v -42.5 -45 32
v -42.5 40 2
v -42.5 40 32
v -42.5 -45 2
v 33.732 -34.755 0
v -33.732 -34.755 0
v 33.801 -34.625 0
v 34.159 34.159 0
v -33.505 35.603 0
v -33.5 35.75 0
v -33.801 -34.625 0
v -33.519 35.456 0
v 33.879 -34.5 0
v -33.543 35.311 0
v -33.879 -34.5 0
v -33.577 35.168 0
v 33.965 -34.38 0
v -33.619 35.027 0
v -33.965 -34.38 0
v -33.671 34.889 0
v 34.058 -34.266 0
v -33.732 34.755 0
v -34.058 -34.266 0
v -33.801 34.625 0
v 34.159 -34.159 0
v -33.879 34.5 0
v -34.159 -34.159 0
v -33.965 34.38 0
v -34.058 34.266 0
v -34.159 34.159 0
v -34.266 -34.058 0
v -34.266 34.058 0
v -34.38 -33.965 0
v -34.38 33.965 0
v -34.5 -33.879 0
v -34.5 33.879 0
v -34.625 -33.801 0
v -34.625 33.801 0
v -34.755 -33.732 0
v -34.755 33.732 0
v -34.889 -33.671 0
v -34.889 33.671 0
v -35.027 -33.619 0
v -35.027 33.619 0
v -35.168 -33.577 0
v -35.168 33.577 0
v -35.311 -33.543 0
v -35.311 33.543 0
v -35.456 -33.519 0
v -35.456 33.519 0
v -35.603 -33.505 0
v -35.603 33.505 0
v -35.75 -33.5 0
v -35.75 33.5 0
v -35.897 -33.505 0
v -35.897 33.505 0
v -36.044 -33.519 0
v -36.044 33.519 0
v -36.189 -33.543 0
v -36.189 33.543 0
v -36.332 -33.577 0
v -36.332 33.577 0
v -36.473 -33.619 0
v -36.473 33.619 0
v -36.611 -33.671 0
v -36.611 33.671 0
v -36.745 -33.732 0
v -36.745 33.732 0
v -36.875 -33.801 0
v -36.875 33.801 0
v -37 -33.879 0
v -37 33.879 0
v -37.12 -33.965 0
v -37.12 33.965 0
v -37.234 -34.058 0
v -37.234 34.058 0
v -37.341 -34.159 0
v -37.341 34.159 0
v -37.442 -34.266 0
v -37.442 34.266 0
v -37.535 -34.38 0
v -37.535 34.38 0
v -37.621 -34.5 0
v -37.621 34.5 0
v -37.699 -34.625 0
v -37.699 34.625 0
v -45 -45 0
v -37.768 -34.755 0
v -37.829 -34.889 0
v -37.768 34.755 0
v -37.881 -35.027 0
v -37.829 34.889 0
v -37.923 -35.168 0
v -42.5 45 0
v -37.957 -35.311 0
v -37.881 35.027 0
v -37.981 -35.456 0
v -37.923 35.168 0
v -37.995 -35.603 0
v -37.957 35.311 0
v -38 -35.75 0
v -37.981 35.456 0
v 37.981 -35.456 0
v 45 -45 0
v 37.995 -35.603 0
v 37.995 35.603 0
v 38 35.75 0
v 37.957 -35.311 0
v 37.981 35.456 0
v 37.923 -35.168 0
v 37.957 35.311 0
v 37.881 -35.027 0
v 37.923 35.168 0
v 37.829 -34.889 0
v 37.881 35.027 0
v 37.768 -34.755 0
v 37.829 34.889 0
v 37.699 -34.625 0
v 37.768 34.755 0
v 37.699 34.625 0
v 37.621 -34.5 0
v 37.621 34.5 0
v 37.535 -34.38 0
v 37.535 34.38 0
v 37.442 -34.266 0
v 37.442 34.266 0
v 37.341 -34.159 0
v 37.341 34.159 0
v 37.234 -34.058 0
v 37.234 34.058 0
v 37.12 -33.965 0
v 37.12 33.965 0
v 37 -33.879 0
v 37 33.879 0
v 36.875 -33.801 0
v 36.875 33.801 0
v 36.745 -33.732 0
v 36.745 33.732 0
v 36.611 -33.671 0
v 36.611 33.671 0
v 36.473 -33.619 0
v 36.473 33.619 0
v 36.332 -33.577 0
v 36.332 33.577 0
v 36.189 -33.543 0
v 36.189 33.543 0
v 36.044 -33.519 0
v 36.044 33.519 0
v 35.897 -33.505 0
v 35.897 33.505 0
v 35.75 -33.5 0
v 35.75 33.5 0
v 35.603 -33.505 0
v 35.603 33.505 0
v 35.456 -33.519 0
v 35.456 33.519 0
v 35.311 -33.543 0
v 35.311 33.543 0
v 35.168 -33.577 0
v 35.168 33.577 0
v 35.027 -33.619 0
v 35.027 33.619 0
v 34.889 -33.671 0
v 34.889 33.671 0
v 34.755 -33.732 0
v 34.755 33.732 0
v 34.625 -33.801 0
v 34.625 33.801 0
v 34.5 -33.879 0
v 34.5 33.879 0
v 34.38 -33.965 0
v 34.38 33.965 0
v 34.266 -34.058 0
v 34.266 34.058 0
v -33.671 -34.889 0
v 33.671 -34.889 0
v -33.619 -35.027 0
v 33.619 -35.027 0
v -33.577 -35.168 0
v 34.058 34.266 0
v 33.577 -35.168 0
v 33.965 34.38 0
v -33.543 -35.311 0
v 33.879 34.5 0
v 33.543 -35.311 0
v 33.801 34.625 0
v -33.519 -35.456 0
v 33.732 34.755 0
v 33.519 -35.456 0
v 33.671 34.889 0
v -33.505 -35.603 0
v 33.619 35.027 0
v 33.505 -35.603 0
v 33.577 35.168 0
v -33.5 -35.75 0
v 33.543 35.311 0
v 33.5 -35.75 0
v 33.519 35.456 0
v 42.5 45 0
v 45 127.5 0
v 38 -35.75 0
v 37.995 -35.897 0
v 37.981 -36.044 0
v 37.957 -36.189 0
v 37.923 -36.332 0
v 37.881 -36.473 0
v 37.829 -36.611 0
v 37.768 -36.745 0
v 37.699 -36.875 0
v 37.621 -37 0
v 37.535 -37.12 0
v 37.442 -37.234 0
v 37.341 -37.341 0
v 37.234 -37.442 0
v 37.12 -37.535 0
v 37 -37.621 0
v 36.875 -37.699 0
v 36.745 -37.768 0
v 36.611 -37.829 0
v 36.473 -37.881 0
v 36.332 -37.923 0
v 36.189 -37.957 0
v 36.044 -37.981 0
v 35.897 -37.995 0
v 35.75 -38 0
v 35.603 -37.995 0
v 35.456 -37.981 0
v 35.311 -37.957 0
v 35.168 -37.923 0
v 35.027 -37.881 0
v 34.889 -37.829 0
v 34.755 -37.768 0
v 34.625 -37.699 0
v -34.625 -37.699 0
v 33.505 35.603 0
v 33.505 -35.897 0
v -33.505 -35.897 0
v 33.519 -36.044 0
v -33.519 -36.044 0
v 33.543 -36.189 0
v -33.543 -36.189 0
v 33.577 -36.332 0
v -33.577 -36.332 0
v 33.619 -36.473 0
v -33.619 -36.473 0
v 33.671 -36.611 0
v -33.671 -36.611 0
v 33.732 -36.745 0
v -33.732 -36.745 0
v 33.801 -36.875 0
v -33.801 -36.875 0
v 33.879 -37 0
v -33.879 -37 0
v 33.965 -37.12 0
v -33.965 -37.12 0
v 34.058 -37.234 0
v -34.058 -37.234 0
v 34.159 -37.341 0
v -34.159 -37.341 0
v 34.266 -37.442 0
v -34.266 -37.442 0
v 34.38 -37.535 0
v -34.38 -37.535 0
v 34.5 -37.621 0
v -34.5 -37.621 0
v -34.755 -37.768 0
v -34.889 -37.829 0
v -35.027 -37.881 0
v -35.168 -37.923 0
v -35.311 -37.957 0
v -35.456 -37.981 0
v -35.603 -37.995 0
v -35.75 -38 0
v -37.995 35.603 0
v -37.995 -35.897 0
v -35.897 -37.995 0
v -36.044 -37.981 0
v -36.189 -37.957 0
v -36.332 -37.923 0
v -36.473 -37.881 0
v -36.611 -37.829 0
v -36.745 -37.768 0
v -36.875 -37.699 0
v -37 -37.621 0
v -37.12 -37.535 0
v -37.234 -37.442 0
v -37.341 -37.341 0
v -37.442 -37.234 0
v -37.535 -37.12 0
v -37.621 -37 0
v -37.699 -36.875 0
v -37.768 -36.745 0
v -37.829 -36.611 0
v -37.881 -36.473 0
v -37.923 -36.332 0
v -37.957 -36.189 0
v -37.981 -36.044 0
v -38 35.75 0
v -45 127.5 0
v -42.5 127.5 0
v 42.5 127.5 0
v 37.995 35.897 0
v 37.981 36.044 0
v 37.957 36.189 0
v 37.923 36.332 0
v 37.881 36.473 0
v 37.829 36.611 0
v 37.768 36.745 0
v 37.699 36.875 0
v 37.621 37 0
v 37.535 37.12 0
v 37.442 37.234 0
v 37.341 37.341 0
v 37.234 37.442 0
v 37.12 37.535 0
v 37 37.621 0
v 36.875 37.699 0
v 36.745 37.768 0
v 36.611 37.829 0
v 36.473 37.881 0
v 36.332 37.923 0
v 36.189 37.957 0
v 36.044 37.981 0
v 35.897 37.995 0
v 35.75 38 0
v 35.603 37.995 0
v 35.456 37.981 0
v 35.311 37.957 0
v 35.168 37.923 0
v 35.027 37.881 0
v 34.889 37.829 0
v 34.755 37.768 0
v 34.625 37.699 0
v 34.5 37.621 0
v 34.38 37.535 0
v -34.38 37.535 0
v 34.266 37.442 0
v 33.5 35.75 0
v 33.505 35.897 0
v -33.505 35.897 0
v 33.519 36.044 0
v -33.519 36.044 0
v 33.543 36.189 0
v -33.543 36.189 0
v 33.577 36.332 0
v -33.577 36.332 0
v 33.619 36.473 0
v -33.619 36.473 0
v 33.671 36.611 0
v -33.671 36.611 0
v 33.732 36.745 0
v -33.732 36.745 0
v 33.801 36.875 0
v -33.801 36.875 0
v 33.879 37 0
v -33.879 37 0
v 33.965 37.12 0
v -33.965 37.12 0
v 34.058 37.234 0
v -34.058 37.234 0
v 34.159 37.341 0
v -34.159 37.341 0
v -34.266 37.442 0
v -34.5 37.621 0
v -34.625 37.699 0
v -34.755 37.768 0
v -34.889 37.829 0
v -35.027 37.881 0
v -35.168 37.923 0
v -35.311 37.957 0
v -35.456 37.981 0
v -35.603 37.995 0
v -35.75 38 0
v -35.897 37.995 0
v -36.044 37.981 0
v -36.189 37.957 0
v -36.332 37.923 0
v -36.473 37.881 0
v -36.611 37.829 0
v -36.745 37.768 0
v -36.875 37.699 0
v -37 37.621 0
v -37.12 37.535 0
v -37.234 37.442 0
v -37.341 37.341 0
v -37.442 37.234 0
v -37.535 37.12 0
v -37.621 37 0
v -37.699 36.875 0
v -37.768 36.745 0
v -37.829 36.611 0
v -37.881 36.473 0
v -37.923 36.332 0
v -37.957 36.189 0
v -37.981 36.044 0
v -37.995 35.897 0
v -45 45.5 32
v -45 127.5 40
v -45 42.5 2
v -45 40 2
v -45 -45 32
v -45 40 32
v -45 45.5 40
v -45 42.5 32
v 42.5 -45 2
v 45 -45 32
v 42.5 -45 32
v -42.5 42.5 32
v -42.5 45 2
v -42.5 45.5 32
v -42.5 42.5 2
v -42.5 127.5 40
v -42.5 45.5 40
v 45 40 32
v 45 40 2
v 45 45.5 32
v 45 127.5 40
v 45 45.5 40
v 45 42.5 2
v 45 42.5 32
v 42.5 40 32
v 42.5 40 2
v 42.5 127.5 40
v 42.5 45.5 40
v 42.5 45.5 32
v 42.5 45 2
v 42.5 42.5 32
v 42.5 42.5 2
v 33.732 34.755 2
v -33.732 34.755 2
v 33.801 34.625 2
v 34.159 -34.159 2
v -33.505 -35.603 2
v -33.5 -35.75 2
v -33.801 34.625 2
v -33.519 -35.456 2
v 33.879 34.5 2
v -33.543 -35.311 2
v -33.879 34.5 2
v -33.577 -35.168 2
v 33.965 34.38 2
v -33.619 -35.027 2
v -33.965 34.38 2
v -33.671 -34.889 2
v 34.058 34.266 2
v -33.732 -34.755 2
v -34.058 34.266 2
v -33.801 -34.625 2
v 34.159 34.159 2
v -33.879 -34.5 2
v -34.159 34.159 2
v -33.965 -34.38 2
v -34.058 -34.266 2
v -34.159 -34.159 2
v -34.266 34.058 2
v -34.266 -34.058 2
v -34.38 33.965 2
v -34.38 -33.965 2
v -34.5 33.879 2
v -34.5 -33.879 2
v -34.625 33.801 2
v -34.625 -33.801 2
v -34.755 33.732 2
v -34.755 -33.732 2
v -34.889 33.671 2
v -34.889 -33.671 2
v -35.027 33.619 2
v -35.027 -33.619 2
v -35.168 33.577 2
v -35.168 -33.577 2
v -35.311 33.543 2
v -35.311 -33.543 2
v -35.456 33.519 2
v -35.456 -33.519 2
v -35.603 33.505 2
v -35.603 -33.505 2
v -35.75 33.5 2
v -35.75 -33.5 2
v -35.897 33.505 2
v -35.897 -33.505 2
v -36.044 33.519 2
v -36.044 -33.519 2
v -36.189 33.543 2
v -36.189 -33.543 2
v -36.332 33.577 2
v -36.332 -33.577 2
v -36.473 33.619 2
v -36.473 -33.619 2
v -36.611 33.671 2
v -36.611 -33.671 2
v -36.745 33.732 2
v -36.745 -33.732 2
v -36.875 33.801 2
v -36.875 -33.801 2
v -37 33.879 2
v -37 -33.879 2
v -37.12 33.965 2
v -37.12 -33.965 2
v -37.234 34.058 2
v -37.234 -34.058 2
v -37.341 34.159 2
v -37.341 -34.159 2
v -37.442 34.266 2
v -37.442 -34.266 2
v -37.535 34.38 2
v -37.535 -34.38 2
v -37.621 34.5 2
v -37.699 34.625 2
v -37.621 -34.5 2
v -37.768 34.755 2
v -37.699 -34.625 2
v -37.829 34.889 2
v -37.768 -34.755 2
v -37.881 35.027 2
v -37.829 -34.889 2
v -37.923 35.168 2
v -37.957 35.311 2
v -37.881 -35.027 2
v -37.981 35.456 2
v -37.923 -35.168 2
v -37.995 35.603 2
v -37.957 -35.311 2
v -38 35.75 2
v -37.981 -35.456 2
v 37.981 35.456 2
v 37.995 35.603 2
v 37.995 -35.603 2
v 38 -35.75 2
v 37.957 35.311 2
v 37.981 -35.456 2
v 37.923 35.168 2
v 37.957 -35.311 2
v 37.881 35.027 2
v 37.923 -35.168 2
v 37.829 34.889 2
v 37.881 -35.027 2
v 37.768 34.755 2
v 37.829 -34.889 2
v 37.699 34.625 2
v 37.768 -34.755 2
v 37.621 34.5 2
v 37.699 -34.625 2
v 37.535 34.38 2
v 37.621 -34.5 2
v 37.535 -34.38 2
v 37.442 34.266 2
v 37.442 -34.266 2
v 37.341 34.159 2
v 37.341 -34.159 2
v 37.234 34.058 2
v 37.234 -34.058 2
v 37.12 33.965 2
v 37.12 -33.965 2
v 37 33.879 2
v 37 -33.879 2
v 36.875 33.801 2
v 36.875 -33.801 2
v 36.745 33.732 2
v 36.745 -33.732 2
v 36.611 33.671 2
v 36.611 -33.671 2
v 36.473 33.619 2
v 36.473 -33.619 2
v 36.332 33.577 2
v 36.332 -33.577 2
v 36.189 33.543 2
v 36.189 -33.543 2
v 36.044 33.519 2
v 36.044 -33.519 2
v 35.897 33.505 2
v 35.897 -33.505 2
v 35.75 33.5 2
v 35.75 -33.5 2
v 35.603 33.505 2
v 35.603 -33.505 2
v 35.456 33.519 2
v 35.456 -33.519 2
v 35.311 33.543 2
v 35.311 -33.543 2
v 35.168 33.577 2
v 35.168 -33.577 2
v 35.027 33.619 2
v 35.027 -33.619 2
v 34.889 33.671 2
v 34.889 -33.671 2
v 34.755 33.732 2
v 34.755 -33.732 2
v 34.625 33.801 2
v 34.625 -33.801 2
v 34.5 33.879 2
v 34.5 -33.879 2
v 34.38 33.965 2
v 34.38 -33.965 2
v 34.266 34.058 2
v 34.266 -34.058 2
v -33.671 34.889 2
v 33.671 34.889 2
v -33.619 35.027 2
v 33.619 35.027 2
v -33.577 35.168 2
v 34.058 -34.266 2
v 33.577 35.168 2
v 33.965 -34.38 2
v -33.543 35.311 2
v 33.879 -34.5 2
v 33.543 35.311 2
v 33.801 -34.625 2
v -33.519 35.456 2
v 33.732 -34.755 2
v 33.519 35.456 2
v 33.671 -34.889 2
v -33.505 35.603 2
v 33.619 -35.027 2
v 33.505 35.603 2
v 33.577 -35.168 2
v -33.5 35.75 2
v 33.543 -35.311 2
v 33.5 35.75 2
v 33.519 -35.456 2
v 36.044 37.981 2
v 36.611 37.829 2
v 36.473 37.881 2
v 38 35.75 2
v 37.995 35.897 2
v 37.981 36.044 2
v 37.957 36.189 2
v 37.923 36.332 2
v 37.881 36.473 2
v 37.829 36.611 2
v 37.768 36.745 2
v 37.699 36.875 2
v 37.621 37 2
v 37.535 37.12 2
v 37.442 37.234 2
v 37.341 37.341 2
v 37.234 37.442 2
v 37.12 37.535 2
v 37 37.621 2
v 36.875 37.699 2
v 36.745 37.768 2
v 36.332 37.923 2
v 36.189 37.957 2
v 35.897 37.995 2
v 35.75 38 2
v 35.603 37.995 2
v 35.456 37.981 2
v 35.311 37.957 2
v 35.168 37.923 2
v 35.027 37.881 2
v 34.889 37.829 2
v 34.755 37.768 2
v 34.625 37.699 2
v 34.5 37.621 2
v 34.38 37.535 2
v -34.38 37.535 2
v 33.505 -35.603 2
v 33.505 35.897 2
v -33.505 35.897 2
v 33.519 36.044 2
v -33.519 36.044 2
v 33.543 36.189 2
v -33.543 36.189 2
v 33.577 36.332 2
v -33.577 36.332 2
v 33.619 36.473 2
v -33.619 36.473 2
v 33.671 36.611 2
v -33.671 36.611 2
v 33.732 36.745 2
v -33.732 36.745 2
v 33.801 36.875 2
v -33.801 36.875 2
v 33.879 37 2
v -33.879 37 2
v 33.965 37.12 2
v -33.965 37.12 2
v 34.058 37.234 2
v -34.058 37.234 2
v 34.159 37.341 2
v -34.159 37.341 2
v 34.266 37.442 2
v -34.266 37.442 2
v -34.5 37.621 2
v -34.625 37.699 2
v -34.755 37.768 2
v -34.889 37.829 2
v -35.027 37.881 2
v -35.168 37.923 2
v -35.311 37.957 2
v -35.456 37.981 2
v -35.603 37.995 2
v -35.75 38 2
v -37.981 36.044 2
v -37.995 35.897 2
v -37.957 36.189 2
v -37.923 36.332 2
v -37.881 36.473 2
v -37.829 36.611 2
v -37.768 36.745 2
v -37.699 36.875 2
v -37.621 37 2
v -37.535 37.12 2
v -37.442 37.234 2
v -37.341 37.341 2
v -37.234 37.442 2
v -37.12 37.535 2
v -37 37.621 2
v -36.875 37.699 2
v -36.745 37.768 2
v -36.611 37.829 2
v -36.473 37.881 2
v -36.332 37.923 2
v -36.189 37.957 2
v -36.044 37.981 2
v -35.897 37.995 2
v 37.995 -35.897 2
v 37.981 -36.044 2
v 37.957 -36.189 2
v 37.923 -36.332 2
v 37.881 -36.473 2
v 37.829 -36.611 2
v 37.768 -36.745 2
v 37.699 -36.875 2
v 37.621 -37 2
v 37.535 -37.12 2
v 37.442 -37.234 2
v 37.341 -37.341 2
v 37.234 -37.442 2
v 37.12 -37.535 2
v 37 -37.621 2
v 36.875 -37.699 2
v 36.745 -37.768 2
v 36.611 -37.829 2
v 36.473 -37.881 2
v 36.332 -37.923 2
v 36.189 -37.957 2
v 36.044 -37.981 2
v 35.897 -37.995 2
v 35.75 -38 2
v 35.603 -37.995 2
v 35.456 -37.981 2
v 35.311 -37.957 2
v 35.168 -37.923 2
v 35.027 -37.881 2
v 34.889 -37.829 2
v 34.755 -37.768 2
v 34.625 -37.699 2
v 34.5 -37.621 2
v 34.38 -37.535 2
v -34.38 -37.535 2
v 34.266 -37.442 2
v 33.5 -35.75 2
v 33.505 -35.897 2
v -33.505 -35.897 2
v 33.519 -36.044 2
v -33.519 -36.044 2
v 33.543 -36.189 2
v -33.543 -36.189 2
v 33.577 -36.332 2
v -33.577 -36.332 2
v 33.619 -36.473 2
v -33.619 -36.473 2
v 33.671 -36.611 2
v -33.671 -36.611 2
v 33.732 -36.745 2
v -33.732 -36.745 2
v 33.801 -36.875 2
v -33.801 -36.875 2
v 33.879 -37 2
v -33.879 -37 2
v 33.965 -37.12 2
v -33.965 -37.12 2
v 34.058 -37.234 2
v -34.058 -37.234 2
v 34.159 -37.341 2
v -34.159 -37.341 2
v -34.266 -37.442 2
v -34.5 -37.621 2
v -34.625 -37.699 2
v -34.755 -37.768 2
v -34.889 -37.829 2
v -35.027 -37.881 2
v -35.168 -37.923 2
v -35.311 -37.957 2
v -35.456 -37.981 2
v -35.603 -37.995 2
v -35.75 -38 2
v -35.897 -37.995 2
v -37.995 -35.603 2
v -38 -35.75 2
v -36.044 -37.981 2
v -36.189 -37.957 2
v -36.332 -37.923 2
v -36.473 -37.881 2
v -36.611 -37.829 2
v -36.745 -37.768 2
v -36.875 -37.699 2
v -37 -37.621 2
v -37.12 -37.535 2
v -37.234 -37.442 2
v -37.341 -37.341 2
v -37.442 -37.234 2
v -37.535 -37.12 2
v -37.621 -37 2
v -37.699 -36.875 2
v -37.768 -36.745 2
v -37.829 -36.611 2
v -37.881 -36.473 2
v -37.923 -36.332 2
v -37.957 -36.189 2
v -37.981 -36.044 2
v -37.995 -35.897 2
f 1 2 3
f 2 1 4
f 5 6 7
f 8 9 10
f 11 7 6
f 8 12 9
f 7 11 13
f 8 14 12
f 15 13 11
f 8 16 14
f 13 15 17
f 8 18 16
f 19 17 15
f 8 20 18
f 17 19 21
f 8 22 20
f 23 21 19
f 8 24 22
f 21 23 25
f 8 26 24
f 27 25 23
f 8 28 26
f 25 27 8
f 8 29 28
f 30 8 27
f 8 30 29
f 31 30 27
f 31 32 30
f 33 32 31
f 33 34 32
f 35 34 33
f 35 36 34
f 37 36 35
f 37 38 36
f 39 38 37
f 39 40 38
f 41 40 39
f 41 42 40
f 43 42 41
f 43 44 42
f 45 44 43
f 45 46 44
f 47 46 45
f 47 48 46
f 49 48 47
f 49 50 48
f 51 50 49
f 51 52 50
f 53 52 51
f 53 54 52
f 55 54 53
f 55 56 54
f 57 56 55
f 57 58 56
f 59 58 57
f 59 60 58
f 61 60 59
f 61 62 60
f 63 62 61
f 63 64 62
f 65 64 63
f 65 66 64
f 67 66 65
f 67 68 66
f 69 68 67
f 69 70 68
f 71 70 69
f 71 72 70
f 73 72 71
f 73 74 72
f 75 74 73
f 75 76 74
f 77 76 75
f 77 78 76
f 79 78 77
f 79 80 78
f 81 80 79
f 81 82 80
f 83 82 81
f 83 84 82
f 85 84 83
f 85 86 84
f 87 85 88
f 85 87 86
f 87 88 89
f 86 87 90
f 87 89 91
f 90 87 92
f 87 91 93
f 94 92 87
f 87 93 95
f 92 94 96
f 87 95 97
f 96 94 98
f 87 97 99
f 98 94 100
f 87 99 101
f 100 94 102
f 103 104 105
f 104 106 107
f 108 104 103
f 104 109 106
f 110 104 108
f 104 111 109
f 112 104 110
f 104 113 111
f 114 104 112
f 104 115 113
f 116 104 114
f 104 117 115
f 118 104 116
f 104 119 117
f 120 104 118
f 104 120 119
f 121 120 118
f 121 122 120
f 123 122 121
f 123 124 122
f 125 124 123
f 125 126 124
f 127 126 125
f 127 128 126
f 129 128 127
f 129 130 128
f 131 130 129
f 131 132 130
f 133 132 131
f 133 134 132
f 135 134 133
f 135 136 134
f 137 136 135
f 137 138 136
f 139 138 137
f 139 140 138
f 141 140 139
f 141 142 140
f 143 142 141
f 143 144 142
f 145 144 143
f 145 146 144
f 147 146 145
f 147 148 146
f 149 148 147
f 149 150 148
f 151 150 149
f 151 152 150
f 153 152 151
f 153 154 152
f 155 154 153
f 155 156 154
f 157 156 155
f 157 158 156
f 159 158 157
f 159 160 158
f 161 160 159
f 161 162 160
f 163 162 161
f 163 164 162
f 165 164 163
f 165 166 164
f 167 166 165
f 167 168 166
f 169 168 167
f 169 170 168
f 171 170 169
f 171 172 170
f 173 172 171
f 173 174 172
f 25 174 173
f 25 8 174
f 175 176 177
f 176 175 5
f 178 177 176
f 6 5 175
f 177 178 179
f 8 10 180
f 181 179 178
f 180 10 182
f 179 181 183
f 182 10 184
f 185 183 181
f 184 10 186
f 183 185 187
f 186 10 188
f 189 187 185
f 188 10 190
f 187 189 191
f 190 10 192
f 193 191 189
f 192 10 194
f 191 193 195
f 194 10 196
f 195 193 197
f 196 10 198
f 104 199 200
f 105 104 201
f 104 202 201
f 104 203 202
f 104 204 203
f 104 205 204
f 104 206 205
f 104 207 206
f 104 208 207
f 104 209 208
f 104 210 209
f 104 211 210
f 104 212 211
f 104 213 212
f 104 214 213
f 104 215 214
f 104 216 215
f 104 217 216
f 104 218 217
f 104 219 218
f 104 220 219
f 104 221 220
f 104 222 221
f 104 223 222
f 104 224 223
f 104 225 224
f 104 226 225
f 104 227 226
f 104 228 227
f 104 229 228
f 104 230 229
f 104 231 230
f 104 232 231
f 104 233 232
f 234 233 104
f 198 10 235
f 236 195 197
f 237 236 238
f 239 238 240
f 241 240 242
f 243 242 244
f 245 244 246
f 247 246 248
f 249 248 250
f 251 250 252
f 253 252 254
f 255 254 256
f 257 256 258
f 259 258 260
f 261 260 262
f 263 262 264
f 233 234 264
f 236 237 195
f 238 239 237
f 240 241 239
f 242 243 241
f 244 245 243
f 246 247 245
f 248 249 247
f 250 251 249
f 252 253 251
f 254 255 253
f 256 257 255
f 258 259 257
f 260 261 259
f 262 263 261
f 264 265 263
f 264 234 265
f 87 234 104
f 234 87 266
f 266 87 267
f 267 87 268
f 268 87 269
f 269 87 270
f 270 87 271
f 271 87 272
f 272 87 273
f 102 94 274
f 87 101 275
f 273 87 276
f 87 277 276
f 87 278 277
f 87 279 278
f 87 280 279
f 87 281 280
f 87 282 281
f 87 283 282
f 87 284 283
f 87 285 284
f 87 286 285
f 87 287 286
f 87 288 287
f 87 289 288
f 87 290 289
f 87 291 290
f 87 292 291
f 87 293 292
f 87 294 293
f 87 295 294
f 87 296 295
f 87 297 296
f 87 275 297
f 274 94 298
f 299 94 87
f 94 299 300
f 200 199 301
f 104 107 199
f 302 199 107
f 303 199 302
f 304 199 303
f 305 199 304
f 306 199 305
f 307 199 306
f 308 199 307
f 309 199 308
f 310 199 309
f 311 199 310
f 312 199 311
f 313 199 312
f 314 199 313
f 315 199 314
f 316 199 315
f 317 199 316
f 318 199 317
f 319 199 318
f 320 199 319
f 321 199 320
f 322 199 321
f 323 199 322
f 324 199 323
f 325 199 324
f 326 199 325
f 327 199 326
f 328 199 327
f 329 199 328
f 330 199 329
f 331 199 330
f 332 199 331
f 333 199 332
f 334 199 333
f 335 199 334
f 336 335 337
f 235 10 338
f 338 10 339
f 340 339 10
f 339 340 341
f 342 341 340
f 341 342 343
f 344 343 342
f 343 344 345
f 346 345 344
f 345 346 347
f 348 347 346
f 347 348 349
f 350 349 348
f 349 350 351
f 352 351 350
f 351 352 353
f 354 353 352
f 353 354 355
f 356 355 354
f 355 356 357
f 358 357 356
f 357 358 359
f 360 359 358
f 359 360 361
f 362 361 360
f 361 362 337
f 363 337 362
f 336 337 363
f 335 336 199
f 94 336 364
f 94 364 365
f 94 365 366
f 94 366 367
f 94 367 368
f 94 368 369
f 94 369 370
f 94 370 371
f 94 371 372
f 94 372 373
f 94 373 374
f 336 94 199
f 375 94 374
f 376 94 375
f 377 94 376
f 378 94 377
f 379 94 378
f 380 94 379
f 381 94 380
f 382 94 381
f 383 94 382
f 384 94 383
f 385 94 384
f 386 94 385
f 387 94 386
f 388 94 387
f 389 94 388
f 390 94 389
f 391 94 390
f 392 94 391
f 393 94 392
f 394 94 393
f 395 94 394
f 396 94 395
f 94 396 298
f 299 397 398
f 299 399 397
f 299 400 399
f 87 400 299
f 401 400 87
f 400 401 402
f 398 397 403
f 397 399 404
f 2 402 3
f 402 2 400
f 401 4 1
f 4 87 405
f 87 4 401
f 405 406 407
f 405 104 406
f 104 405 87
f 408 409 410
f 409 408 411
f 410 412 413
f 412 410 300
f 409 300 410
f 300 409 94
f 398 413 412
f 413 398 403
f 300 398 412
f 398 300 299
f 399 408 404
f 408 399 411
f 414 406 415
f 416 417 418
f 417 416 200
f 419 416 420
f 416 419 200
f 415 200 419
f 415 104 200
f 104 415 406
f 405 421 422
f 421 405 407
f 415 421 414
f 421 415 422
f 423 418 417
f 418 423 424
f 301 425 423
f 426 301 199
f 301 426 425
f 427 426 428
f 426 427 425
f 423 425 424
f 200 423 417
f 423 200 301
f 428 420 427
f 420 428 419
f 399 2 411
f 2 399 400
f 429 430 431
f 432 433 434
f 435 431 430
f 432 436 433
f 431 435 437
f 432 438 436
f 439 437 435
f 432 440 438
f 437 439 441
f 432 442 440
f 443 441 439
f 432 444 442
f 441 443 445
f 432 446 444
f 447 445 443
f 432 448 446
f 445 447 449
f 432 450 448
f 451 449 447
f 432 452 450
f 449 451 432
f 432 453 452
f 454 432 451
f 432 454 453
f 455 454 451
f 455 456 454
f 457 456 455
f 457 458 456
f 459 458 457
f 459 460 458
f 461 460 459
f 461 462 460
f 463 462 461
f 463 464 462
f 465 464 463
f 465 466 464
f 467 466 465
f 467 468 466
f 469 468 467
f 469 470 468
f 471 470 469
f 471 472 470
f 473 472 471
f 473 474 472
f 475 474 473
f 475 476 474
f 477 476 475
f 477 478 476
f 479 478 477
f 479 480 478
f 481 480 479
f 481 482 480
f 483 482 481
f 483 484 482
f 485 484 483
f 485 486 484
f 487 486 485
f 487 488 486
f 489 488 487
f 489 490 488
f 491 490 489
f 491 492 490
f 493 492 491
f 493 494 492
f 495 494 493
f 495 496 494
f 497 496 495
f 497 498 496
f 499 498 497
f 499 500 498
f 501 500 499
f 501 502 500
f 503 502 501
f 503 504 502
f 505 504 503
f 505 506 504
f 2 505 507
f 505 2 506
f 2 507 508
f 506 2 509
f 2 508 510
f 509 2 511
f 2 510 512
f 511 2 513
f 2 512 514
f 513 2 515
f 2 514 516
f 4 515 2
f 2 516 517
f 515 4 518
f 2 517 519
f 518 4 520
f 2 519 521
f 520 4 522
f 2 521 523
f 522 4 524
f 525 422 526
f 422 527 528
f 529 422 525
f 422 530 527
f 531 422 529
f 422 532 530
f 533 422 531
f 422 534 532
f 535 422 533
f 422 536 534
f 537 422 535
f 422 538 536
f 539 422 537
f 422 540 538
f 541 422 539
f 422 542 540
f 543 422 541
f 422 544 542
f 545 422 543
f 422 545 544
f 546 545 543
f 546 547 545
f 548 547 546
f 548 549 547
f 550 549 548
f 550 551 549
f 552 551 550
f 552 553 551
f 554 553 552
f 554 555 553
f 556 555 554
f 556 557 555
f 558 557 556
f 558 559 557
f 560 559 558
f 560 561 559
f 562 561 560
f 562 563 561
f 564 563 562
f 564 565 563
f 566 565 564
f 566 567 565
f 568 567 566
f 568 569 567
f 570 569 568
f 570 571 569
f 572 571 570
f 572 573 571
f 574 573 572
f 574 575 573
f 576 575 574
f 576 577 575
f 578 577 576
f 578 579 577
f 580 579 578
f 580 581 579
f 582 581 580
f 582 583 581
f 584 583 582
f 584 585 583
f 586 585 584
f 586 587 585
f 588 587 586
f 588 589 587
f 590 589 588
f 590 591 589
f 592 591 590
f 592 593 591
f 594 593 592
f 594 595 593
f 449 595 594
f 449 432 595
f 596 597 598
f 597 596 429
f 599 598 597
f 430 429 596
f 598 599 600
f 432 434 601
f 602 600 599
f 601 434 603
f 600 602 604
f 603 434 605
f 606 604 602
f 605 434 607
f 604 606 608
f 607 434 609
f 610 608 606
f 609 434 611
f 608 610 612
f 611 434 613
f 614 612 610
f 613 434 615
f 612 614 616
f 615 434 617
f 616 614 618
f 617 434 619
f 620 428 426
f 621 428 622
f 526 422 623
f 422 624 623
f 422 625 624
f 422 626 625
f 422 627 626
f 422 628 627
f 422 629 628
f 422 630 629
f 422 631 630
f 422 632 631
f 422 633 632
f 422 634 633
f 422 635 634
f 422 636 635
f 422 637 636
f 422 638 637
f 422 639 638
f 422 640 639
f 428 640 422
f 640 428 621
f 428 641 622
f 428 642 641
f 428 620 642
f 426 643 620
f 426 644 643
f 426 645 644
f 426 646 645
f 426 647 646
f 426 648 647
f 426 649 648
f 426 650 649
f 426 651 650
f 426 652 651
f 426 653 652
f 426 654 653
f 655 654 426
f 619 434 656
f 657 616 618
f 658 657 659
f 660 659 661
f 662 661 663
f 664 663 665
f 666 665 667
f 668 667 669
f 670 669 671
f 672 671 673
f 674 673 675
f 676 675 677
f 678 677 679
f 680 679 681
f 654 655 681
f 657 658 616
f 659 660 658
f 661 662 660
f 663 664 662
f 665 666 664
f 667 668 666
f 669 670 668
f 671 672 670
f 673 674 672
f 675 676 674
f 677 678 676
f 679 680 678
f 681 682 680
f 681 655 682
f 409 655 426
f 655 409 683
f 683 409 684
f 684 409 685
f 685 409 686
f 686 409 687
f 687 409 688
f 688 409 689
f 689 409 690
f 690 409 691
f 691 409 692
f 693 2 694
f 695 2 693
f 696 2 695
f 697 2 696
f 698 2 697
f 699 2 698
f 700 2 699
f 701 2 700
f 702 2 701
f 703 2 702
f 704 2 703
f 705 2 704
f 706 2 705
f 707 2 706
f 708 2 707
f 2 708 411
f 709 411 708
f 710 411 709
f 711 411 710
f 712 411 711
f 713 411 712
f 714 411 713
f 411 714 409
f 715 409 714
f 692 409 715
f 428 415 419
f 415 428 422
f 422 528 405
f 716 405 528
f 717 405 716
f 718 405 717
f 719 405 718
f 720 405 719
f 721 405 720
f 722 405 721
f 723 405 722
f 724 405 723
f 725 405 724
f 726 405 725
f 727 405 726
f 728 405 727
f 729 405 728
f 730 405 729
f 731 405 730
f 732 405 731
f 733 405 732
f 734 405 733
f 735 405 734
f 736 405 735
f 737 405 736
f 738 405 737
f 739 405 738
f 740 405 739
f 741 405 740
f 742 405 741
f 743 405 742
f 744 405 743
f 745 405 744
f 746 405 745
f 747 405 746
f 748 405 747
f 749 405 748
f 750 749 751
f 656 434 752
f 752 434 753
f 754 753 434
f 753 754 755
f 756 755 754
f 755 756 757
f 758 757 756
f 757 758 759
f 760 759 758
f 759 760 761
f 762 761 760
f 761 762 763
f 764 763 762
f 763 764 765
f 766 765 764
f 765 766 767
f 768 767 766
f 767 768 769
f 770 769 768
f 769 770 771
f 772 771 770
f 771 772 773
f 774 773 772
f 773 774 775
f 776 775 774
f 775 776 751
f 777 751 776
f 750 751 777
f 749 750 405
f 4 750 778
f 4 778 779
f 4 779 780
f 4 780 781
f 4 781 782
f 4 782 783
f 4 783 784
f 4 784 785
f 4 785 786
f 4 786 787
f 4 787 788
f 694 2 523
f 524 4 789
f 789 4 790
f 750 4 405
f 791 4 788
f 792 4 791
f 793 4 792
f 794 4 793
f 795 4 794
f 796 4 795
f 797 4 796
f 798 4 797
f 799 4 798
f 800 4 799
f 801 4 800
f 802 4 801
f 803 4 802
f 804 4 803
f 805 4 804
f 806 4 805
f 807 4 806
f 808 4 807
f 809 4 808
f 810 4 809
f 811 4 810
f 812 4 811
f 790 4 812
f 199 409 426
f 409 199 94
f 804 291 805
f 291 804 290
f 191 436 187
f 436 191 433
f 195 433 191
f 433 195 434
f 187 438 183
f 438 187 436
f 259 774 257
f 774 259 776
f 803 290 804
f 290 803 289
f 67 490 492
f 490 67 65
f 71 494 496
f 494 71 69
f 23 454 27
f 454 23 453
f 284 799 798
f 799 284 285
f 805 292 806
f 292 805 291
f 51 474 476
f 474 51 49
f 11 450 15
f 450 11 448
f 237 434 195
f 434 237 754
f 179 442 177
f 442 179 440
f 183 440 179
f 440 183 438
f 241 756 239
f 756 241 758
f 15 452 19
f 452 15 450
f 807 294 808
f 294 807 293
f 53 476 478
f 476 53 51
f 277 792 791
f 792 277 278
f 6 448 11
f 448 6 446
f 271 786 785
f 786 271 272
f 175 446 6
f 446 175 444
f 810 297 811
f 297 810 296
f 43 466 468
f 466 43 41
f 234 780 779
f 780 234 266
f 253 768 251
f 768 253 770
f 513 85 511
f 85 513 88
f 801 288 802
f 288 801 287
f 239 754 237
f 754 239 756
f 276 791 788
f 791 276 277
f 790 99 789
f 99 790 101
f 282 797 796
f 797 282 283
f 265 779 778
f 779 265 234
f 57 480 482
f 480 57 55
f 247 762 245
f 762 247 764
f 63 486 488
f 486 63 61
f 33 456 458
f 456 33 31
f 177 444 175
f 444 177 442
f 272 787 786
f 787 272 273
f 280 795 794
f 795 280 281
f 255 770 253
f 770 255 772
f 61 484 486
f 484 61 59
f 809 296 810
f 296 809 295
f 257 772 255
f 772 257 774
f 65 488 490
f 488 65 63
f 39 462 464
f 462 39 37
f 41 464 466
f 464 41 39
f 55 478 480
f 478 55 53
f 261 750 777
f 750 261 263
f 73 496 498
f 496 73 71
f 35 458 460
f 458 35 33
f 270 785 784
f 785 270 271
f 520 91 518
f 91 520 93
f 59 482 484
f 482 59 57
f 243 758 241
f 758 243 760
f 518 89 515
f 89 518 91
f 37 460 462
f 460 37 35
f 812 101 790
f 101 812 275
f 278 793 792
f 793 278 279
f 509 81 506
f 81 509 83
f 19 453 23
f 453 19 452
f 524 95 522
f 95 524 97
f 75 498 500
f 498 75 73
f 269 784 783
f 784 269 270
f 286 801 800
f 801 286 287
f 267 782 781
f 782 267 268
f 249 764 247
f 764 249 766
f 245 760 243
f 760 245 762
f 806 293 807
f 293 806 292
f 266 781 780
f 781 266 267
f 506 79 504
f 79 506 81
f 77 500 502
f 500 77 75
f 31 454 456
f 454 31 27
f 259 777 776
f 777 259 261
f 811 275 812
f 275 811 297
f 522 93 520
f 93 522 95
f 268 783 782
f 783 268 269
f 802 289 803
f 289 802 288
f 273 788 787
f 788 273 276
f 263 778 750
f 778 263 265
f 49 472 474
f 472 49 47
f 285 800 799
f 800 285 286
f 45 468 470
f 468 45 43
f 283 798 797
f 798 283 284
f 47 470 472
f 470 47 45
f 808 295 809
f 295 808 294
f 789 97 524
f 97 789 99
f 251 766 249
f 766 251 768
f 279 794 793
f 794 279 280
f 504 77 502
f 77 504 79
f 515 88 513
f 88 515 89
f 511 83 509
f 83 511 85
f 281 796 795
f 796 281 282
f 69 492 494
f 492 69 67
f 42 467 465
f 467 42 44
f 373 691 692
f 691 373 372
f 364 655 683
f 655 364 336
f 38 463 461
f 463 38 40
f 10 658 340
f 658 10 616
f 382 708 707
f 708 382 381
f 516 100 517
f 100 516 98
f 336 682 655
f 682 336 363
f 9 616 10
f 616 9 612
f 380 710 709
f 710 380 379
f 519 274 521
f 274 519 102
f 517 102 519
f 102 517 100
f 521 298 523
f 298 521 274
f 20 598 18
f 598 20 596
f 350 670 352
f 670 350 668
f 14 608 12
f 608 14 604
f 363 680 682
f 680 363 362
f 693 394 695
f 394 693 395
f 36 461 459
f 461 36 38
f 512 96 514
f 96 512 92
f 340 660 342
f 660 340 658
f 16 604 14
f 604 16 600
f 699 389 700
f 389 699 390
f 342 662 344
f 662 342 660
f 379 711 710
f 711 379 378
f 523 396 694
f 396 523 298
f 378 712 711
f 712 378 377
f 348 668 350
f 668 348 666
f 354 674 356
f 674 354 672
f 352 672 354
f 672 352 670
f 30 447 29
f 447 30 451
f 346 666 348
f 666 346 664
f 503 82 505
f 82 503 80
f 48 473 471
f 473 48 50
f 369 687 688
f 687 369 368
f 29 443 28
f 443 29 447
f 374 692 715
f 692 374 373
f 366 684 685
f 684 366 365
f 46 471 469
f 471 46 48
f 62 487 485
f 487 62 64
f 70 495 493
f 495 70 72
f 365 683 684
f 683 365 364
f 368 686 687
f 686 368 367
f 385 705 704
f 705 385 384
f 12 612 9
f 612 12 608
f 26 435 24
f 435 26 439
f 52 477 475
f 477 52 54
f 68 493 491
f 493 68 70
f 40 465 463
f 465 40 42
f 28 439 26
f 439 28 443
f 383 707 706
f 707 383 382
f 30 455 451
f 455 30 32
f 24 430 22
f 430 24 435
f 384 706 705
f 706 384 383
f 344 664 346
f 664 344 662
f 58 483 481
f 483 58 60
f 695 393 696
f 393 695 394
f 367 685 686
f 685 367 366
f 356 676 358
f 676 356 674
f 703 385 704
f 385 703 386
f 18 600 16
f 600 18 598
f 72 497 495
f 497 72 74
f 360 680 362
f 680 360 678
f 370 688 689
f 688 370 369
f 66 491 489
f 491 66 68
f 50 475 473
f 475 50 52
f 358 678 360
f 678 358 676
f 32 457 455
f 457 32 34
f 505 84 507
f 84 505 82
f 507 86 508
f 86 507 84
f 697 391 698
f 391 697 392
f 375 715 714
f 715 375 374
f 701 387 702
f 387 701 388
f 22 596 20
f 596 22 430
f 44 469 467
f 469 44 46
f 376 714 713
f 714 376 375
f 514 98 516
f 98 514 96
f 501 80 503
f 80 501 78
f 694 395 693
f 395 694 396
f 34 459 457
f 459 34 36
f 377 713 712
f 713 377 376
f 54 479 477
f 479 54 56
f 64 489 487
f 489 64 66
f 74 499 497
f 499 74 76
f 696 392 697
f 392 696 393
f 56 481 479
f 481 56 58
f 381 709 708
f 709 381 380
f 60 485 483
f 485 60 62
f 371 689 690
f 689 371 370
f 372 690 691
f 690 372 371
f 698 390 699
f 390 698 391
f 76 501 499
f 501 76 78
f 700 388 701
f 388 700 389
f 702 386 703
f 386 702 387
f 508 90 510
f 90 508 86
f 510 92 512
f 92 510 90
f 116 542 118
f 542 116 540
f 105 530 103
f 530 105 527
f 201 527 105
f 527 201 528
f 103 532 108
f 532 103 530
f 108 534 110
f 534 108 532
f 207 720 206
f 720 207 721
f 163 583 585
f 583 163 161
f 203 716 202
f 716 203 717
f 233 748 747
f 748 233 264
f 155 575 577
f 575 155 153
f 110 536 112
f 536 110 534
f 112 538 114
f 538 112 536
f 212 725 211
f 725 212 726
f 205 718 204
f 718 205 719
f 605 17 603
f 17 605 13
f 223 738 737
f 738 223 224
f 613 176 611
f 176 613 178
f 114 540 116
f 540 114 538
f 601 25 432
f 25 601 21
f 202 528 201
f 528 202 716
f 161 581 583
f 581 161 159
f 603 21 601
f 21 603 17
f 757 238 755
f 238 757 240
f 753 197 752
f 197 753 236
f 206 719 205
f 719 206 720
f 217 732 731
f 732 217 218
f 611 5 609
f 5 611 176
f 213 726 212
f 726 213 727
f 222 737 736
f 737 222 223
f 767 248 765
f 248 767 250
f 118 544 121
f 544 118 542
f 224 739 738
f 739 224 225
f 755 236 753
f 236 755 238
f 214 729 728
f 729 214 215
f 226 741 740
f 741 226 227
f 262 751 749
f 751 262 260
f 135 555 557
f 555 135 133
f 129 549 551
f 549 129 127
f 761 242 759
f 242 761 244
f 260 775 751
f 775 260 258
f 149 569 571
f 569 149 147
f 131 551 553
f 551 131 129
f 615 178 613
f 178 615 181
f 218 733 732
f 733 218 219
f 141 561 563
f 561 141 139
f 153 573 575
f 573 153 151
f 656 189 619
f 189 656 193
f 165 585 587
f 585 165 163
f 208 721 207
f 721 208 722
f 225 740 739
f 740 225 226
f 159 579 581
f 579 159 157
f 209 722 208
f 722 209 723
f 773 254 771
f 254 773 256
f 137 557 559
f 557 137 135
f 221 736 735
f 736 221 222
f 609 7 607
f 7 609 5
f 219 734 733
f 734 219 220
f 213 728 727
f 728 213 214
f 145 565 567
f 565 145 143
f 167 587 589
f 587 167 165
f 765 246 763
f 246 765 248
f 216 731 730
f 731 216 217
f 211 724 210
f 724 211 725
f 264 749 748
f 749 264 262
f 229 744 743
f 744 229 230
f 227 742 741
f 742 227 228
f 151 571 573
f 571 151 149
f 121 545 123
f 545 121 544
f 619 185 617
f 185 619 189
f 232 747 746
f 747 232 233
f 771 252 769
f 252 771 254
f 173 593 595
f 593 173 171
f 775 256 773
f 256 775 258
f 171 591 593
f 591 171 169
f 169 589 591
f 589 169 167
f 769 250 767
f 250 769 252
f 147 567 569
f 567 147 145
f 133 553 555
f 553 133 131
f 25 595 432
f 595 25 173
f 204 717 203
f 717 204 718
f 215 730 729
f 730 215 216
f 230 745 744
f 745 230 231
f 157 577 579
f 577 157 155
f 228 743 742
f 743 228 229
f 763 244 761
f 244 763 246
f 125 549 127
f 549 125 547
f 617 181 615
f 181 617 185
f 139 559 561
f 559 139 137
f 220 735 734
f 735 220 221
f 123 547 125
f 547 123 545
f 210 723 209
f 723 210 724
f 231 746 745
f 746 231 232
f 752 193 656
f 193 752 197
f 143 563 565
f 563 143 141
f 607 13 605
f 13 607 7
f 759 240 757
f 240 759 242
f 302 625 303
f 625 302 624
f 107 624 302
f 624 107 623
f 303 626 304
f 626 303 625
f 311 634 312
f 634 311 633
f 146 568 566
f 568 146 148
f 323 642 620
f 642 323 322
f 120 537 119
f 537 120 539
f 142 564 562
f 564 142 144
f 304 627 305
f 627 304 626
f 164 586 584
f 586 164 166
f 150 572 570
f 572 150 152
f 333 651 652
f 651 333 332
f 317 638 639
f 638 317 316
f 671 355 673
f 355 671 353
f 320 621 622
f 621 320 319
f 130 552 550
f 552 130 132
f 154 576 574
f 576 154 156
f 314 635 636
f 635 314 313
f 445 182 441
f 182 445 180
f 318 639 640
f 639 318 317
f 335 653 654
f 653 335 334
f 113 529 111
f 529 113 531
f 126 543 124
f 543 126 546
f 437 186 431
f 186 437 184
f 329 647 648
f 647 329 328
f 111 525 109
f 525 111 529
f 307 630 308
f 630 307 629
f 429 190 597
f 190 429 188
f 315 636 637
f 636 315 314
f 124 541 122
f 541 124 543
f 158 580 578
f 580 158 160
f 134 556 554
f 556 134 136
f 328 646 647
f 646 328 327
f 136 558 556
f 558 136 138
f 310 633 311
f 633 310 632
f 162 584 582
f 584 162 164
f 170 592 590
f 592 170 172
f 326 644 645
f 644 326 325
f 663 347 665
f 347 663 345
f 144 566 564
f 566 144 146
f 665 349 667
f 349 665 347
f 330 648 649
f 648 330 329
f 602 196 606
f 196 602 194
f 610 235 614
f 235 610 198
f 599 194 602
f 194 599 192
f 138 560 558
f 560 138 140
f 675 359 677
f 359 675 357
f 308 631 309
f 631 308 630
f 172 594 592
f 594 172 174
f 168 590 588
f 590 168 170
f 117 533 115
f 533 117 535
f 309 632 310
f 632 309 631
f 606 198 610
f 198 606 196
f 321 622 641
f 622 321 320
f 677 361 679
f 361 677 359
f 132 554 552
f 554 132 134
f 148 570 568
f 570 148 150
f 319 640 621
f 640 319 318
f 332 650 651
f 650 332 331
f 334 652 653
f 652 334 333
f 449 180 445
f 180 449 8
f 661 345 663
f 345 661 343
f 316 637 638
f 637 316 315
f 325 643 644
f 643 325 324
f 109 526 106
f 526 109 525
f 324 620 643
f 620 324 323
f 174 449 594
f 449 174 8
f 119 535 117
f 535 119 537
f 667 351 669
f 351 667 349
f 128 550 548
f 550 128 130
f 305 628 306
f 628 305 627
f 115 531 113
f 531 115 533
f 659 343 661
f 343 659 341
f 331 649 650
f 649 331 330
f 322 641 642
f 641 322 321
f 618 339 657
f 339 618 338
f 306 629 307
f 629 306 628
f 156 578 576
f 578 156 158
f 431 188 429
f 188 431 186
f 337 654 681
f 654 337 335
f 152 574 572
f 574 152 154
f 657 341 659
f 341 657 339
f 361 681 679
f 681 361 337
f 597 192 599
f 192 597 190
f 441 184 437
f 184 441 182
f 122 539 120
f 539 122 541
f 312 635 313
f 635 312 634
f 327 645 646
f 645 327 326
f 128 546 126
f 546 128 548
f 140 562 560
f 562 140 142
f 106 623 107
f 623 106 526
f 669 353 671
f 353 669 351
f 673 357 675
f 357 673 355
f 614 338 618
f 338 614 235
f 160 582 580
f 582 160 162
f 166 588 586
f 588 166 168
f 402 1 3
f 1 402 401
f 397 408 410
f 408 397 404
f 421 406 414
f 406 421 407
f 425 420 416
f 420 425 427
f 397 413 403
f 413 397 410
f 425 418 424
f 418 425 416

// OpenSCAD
// DIY magnetic stirrer housing (print orientation: upside down)
// Units: mm

// ---- Parameters ----
fan_d      = 80;    // fan diameter
outer_x    = 90;    // outer size in X
outer_y    = 90;    // outer size in Y
wall       = 2.5;   // wall thickness
top_t      = 2;     // top plate thickness (z = 0 to 2)
box_h      = 40;    // height of open box (top of walls at z = 40)
screw_d    = 4.5;   // M4 screw hole diameter
screw_pitch = 71.5; // square pattern size for screw holes
notch_w    = 12;    // cable notch width
notch_h    = 8;     // cable notch depth from open edge (z = 32 to 40)
eps        = 0.5;   // cutter overshoot

$fn = 96;

// ---- Model ----
difference() {
    // Main body: top plate + four walls
    union() {
        // Top plate
        translate([-outer_x/2, -outer_y/2, 0])
            cube([outer_x, outer_y, top_t]);
        // Walls (open top at z = box_h)
        for (dx = [-1, 1], dy = [-1, 1])
            translate([dx > 0 ? outer_x/2 - wall : -outer_x/2,
                       dy > 0 ? outer_y/2 - wall : -outer_y/2,
                       0])
                cube([wall, outer_y - 2*wall, box_h]);
    }

    // Screw holes through top plate
    for (x = [-screw_pitch/2, screw_pitch/2],
           y = [-screw_pitch/2, screw_pitch/2])
        translate([x, y, -eps])
            cylinder(d = screw_d, h = top_t + 2*eps);

    // Cable notch in one wall (from z = box_h - notch_h to box_h)
    translate([-outer_x/2 - eps, -outer_y/2 - eps, box_h - notch_h])
        cube([outer_x + 2*eps, outer_y + 2*eps, notch_h + eps]);
}
